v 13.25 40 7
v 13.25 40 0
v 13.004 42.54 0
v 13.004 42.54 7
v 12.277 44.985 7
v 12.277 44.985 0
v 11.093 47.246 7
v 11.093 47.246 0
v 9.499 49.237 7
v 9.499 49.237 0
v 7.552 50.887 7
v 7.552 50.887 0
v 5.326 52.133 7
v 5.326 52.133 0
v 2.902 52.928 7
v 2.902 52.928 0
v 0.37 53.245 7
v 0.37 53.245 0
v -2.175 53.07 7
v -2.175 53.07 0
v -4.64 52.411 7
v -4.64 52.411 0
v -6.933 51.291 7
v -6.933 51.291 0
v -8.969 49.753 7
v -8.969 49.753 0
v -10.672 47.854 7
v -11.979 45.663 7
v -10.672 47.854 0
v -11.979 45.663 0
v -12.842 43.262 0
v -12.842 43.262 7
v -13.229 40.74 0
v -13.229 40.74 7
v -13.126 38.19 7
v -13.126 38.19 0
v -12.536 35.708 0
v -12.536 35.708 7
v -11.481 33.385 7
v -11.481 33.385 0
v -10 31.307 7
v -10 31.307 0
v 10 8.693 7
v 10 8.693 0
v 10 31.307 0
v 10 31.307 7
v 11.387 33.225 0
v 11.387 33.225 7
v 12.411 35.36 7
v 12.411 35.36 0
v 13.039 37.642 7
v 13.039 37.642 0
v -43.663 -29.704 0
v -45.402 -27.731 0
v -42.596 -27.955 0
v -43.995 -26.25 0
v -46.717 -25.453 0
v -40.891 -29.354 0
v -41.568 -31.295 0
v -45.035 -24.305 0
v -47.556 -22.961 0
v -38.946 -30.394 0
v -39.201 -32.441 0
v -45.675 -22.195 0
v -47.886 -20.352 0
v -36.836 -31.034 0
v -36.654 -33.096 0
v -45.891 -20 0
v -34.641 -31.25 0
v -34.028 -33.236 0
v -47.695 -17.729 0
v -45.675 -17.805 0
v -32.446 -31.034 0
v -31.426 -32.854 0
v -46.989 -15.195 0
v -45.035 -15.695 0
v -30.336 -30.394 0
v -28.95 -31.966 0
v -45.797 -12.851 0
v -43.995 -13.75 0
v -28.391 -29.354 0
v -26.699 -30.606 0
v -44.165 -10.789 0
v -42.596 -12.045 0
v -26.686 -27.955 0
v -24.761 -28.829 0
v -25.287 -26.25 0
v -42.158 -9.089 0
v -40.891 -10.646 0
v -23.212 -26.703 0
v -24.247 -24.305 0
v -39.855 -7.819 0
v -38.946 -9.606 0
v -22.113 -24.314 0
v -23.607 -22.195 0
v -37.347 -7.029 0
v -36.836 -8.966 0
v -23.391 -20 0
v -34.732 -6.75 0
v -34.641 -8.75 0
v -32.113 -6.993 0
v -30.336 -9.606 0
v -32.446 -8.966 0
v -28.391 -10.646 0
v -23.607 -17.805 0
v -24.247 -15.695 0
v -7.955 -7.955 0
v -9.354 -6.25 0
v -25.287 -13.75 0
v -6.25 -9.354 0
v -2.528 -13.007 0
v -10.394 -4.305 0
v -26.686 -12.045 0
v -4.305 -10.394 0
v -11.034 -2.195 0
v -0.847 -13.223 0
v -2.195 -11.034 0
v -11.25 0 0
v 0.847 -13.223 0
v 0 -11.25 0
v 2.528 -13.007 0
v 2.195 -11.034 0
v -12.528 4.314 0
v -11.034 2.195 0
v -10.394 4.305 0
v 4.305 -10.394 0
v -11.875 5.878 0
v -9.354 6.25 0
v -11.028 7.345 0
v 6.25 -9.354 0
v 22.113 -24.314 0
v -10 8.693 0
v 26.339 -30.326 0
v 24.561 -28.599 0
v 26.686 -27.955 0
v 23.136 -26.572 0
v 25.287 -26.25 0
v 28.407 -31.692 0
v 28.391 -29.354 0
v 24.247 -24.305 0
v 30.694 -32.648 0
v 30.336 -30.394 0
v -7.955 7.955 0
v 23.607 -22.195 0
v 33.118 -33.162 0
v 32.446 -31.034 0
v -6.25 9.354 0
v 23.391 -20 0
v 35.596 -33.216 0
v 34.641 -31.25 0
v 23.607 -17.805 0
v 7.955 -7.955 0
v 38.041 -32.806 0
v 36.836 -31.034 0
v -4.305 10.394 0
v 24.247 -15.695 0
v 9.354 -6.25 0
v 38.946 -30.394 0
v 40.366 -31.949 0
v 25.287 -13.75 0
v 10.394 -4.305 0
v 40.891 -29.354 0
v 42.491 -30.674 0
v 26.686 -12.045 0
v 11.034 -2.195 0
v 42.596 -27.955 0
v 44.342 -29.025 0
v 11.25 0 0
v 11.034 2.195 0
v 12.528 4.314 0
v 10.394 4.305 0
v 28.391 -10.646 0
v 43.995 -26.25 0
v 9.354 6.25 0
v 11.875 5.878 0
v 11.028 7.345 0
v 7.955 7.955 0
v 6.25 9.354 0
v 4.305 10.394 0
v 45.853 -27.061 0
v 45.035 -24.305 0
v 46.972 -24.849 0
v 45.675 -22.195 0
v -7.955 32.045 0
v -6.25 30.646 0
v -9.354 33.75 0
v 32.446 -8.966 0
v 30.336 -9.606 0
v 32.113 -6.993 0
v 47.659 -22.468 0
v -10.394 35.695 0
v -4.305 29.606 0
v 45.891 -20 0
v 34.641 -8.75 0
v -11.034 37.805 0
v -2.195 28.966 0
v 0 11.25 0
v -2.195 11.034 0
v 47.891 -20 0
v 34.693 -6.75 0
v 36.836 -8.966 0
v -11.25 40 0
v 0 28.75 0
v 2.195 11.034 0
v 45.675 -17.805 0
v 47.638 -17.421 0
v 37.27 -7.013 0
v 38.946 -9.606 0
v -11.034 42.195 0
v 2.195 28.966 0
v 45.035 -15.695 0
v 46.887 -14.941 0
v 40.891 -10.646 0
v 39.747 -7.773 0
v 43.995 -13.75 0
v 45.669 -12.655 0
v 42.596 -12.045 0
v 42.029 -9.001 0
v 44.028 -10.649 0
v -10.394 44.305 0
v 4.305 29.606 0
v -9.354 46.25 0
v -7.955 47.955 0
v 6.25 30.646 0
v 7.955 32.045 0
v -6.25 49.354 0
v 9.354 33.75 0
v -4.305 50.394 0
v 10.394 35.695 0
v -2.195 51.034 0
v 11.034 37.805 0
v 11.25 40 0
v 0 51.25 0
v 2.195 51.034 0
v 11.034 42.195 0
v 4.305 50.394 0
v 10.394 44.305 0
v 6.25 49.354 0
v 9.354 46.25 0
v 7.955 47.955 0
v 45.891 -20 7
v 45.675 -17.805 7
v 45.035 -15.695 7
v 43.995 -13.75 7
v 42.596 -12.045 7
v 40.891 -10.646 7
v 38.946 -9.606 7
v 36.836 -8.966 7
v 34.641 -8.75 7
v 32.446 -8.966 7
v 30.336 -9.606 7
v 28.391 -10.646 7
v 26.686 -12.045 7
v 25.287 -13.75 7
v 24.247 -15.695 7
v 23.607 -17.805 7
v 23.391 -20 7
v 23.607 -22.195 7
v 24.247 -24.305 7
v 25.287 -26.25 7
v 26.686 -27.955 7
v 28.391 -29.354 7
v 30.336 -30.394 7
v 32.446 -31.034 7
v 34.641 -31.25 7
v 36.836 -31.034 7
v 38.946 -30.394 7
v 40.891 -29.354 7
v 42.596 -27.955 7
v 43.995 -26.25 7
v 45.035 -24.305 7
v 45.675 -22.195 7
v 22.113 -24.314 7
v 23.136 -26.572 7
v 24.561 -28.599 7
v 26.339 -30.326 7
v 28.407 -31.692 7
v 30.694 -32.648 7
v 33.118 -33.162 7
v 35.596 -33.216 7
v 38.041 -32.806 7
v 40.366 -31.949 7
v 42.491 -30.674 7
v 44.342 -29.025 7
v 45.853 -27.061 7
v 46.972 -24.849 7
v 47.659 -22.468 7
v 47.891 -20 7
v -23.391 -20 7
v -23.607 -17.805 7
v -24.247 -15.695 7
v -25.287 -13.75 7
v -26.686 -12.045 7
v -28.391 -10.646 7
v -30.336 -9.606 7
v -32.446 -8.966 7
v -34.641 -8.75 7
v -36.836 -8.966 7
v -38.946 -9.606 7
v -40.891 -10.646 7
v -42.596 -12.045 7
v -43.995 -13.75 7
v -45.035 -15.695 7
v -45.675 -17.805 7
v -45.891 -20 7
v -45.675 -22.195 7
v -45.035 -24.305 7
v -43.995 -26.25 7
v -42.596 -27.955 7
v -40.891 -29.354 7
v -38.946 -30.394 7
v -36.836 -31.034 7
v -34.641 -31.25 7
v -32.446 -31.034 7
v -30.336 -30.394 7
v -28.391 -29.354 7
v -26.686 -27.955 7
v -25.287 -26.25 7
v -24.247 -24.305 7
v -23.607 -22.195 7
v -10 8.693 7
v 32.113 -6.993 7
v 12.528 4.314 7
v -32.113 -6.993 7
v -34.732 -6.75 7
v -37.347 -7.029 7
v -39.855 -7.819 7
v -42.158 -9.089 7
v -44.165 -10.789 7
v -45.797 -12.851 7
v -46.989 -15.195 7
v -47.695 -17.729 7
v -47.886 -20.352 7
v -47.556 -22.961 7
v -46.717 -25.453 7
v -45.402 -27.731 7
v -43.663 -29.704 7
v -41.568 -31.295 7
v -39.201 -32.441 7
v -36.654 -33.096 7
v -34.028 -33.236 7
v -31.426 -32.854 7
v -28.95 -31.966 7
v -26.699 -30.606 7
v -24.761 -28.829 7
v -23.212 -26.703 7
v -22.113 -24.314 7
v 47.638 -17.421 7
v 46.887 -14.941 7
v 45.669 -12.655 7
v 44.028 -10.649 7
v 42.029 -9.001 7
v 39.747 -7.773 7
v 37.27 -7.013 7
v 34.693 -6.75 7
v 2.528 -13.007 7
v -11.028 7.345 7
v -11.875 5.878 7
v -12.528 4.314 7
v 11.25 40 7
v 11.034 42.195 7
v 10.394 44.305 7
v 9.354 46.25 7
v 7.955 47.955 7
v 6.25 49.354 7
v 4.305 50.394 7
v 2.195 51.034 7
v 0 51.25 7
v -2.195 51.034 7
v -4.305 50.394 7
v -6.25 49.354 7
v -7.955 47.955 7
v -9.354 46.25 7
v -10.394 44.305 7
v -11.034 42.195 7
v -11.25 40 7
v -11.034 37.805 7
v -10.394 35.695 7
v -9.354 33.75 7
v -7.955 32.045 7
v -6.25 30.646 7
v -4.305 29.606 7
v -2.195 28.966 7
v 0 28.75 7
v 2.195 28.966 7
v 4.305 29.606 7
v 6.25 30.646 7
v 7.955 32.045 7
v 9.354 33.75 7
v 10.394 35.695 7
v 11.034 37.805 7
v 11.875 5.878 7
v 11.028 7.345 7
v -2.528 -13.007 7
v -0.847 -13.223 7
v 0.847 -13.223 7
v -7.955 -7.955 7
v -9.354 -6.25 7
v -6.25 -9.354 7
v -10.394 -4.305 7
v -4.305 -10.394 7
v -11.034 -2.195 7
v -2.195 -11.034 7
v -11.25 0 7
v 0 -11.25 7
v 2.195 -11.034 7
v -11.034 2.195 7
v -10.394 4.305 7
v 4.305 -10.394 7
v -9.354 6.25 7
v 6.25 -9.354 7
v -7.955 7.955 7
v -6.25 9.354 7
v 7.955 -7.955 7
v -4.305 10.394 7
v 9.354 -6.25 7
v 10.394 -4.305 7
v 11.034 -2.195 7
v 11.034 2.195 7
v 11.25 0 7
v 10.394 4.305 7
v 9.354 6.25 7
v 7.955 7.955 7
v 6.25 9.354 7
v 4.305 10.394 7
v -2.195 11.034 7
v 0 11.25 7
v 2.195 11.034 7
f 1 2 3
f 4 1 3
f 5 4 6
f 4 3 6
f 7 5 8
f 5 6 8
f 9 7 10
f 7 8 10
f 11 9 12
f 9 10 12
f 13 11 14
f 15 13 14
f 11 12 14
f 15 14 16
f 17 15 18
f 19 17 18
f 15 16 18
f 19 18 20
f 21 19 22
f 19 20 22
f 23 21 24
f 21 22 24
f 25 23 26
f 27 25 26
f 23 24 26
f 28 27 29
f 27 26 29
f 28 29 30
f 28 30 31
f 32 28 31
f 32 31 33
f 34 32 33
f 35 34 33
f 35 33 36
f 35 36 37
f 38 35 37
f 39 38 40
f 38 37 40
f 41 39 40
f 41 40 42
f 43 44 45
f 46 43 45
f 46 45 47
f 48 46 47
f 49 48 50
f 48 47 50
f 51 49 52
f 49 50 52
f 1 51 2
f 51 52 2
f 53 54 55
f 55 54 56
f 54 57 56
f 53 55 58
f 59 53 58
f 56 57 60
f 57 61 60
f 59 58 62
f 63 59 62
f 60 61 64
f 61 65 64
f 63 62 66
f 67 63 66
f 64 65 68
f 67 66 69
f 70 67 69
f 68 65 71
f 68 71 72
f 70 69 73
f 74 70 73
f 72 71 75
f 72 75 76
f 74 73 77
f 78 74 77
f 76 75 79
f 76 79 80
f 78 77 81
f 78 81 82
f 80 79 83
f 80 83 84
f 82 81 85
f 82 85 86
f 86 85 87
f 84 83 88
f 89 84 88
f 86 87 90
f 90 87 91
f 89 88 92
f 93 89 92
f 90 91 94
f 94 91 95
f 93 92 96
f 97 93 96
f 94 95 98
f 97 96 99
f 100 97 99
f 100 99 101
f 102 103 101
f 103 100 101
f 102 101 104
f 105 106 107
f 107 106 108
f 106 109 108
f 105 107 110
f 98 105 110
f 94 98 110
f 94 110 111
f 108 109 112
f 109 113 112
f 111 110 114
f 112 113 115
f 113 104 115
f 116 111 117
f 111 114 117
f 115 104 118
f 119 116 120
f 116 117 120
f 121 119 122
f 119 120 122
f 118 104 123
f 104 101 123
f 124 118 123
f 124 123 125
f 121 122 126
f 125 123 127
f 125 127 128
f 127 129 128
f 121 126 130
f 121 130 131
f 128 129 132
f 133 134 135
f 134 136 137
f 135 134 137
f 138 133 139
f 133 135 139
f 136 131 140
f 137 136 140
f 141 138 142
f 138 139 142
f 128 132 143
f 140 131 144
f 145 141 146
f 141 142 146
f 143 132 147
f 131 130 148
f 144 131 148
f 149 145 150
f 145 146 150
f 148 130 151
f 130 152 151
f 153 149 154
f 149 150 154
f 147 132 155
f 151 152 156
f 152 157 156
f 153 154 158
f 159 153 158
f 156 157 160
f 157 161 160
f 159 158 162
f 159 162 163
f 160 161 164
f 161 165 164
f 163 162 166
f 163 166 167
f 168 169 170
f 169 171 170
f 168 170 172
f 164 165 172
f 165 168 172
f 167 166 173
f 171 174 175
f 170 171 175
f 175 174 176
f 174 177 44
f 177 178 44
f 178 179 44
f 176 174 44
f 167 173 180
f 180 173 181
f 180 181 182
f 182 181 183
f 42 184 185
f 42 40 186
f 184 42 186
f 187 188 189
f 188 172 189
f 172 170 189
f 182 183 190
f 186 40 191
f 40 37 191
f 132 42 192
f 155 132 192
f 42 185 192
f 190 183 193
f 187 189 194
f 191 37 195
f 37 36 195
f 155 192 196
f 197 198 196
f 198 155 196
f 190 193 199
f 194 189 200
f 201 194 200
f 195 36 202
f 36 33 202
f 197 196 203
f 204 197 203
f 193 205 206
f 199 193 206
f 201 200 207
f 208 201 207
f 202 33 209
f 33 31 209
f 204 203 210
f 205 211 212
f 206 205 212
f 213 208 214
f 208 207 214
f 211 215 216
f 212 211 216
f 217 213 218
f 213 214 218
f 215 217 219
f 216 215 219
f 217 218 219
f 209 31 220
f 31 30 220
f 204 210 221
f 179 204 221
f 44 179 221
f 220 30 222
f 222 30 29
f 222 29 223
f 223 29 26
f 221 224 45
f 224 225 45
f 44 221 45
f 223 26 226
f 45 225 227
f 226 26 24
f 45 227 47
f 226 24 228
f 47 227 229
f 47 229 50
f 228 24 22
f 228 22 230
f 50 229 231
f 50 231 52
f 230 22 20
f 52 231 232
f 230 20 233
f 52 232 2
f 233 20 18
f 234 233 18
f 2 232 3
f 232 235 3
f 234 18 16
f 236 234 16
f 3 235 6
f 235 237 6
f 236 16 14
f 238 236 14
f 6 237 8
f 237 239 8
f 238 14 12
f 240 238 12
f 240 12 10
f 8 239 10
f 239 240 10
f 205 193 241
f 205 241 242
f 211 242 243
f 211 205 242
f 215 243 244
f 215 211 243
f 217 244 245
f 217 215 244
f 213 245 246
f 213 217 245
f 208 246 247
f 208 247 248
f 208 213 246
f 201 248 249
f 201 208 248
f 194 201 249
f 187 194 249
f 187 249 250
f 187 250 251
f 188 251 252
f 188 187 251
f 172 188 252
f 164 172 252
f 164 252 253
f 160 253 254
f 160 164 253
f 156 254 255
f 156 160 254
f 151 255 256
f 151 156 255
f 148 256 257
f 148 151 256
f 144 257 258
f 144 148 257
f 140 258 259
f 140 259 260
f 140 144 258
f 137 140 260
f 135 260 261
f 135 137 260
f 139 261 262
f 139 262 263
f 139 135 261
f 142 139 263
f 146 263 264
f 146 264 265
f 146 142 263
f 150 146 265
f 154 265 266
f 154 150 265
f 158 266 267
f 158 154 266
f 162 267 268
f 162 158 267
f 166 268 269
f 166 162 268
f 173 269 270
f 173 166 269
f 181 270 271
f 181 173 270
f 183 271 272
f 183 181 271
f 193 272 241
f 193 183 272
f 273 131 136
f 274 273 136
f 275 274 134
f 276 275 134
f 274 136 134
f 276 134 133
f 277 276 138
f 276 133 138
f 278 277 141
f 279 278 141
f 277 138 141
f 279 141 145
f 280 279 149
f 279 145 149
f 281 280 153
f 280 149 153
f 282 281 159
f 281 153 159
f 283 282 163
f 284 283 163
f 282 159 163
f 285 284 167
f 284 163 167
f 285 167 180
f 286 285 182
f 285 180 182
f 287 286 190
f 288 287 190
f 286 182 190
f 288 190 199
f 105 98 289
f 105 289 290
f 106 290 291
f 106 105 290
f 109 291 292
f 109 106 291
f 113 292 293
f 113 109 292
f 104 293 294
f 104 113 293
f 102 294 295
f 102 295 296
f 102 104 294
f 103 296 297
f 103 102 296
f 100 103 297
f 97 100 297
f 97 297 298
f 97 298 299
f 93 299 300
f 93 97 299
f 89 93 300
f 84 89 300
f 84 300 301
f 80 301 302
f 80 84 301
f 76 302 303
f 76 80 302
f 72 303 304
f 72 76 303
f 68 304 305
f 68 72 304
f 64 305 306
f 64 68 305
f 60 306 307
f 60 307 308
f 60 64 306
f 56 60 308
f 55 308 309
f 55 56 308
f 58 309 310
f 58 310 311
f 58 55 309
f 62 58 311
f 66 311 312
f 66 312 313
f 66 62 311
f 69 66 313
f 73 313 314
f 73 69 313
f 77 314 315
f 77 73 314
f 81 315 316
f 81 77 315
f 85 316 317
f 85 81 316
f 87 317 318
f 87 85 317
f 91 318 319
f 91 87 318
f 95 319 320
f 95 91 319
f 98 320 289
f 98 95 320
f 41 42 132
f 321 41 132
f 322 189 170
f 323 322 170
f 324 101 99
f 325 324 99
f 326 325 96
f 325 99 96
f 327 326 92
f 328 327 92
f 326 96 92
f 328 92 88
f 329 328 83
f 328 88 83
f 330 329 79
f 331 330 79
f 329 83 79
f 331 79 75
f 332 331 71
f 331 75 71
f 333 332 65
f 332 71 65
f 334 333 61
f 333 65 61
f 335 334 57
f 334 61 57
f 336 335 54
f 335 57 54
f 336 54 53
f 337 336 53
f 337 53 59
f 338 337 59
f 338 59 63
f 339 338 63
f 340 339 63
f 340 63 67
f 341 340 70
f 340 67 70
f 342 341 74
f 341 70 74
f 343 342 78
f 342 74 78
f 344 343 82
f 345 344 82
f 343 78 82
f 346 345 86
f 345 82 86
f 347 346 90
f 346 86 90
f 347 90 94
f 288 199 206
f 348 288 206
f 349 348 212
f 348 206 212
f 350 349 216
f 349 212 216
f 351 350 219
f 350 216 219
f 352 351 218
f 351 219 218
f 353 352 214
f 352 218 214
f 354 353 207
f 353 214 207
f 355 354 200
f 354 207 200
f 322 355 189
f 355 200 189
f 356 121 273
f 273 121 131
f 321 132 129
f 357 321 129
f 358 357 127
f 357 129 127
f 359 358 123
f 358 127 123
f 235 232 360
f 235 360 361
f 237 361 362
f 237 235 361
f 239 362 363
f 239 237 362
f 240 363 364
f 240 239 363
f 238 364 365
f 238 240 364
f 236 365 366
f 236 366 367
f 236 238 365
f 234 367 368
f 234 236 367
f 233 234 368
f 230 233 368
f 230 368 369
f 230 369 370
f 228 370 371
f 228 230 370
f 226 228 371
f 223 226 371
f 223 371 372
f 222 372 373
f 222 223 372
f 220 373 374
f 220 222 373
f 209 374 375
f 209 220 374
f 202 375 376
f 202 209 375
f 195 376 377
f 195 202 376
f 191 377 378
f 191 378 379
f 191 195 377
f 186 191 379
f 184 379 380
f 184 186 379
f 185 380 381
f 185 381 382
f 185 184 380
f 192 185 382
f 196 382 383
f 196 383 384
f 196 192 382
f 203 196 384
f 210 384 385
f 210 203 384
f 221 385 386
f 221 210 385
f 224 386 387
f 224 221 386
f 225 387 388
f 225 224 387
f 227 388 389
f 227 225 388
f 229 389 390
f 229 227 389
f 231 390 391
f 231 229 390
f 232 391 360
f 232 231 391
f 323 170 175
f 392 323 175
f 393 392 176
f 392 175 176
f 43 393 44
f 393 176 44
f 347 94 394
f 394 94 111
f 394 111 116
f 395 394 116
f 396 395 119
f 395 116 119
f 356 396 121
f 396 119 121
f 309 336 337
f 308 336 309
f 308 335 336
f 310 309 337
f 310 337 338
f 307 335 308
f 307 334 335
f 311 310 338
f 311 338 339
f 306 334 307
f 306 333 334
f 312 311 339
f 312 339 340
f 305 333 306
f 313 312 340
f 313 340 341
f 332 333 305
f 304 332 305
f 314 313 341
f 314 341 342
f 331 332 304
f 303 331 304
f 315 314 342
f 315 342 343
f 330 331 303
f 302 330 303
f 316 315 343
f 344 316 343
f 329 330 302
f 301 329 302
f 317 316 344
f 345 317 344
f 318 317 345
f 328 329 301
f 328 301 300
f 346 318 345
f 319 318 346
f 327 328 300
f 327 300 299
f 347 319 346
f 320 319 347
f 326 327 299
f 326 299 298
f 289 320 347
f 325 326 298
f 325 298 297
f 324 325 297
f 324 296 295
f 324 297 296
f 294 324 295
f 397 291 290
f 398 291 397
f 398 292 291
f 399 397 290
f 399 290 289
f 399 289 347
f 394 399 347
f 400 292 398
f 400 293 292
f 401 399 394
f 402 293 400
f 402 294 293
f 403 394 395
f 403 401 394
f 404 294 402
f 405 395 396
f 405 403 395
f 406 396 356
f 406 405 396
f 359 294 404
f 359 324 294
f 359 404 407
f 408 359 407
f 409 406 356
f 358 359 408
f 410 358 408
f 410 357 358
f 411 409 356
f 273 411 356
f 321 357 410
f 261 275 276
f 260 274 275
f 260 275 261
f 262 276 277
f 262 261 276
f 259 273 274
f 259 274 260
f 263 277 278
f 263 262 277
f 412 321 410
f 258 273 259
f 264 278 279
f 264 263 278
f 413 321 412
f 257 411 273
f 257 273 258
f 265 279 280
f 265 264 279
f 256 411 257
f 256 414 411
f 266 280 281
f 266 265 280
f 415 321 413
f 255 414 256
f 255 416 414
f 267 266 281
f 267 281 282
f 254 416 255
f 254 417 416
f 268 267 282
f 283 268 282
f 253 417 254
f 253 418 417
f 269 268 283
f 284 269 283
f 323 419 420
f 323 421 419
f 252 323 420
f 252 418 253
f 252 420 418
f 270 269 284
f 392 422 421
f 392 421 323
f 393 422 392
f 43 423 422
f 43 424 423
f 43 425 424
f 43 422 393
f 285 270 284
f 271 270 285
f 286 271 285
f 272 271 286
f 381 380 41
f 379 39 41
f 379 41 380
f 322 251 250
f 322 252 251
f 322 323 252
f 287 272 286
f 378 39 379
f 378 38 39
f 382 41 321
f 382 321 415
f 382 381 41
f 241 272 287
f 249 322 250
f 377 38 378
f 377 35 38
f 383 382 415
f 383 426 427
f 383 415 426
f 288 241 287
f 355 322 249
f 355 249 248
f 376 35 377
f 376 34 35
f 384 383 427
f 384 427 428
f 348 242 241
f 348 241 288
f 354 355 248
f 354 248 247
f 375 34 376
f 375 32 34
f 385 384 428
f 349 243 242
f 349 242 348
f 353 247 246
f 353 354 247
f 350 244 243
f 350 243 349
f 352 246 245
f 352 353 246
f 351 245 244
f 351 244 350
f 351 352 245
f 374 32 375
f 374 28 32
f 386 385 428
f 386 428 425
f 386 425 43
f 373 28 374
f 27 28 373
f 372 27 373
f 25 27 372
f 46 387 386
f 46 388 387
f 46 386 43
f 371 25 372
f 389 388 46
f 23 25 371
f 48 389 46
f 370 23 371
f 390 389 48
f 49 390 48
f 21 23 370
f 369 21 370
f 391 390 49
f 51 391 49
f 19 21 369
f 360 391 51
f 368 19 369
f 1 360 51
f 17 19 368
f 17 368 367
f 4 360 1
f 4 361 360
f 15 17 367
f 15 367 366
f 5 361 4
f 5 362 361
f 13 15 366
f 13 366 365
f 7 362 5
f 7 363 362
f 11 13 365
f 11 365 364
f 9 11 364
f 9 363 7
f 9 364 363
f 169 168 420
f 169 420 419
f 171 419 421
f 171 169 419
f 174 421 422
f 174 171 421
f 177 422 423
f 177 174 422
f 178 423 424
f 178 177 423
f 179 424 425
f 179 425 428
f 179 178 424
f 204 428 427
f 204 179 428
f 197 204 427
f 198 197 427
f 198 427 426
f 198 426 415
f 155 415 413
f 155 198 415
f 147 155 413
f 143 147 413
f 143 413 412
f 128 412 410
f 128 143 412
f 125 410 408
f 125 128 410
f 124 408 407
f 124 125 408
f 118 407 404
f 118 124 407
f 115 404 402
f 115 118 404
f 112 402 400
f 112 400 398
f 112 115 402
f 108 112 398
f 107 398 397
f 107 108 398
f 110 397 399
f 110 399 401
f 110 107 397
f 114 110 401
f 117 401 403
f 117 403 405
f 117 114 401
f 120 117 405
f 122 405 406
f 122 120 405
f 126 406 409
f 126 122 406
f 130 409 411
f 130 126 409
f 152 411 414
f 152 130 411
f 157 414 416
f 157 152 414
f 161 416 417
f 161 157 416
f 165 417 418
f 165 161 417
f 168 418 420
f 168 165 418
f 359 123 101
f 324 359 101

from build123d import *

# Parameters (mm, degrees)
F0_R     = 11.25
F1_DEPTH = 7


with BuildPart() as f1:
    # F0 (on Top) → F1 (new body)
    with BuildSketch(Plane.XY):
        with BuildLine():
            ThreePointArc((2.528072, -13.006589), (10.223978, -8.428094), (13.25, 0))
            ThreePointArc((13.25, 0), (13.068272, 2.186954), (12.528072, 4.313919))
            ThreePointArc((12.528072, 4.313919), (11.474837, 6.625), (10, 8.692669))
            ThreePointArc((10, 8.692669), (0, 13.25), (-10, 8.692669))
            ThreePointArc((-10, 8.692669), (-11.474837, 6.625), (-12.528072, 4.313919))
            ThreePointArc((-12.528072, 4.313919), (-11.474837, -6.625), (-2.528072, -13.006589))
            ThreePointArc((-2.528072, -13.006589), (0, -13.25), (2.528072, -13.006589))
        make_face()
        Circle(F0_R, mode=Mode.SUBTRACT)
        with BuildLine():
            ThreePointArc((12.528072, 4.313919), (13.068272, 2.186954), (13.25, 0))
            ThreePointArc((13.25, 0), (10.223978, -8.428094), (2.528072, -13.006589))
            Line((2.528072, -13.006589), (22.112944, -24.313919))
            ThreePointArc((22.112944, -24.313919), (23.16618, -13.375), (32.112944, -6.993411))
            Line((32.112944, -6.993411), (12.528072, 4.313919))
        make_face()
        with BuildLine():
            ThreePointArc((-10, 8.692669), (0, 13.25), (10, 8.692669))
            Line((10, 8.692669), (10, 31.307331))
            ThreePointArc((10, 31.307331), (0, 26.75), (-10, 31.307331))
            Line((-10, 31.307331), (-10, 8.692669))
        make_face()
        with BuildLine():
            ThreePointArc((47.891016, -20), (43.06911, -9.776022), (32.112944, -6.993411))
            ThreePointArc((32.112944, -6.993411), (23.16618, -13.375), (22.112944, -24.313919))
            ThreePointArc((22.112944, -24.313919), (36.827971, -33.068272), (47.891016, -20))
        make_face()
        with Locations((34.641016, -20)):
            Circle(F0_R, mode=Mode.SUBTRACT)
        with BuildLine():
            Line((-22.112944, -24.313919), (-2.528072, -13.006589))
            ThreePointArc((-2.528072, -13.006589), (-11.474837, -6.625), (-12.528072, 4.313919))
            Line((-12.528072, 4.313919), (-32.112944, -6.993411))
            ThreePointArc((-32.112944, -6.993411), (-24.417038, -11.571906), (-21.391016, -20))
            ThreePointArc((-21.391016, -20), (-21.572744, -22.186954), (-22.112944, -24.313919))
        make_face()
        with BuildLine():
            ThreePointArc((-10, 31.307331), (0, 26.75), (10, 31.307331))
            ThreePointArc((10, 31.307331), (12.410933, 35.359822), (13.25, 40))
            ThreePointArc((13.25, 40), (-4.640178, 52.410933), (-10, 31.307331))
        make_face()
        with Locations((0, 40)):
            Circle(F0_R, mode=Mode.SUBTRACT)
        with BuildLine():
            ThreePointArc((-32.112944, -6.993411), (-46.115853, -26.625), (-22.112944, -24.313919))
            ThreePointArc((-22.112944, -24.313919), (-21.572744, -22.186954), (-21.391016, -20))
            ThreePointArc((-21.391016, -20), (-24.417038, -11.571906), (-32.112944, -6.993411))
        make_face()
        with Locations((-34.641016, -20)):
            Circle(F0_R, mode=Mode.SUBTRACT)
    extrude(amount=F1_DEPTH)


solid = f1.part
